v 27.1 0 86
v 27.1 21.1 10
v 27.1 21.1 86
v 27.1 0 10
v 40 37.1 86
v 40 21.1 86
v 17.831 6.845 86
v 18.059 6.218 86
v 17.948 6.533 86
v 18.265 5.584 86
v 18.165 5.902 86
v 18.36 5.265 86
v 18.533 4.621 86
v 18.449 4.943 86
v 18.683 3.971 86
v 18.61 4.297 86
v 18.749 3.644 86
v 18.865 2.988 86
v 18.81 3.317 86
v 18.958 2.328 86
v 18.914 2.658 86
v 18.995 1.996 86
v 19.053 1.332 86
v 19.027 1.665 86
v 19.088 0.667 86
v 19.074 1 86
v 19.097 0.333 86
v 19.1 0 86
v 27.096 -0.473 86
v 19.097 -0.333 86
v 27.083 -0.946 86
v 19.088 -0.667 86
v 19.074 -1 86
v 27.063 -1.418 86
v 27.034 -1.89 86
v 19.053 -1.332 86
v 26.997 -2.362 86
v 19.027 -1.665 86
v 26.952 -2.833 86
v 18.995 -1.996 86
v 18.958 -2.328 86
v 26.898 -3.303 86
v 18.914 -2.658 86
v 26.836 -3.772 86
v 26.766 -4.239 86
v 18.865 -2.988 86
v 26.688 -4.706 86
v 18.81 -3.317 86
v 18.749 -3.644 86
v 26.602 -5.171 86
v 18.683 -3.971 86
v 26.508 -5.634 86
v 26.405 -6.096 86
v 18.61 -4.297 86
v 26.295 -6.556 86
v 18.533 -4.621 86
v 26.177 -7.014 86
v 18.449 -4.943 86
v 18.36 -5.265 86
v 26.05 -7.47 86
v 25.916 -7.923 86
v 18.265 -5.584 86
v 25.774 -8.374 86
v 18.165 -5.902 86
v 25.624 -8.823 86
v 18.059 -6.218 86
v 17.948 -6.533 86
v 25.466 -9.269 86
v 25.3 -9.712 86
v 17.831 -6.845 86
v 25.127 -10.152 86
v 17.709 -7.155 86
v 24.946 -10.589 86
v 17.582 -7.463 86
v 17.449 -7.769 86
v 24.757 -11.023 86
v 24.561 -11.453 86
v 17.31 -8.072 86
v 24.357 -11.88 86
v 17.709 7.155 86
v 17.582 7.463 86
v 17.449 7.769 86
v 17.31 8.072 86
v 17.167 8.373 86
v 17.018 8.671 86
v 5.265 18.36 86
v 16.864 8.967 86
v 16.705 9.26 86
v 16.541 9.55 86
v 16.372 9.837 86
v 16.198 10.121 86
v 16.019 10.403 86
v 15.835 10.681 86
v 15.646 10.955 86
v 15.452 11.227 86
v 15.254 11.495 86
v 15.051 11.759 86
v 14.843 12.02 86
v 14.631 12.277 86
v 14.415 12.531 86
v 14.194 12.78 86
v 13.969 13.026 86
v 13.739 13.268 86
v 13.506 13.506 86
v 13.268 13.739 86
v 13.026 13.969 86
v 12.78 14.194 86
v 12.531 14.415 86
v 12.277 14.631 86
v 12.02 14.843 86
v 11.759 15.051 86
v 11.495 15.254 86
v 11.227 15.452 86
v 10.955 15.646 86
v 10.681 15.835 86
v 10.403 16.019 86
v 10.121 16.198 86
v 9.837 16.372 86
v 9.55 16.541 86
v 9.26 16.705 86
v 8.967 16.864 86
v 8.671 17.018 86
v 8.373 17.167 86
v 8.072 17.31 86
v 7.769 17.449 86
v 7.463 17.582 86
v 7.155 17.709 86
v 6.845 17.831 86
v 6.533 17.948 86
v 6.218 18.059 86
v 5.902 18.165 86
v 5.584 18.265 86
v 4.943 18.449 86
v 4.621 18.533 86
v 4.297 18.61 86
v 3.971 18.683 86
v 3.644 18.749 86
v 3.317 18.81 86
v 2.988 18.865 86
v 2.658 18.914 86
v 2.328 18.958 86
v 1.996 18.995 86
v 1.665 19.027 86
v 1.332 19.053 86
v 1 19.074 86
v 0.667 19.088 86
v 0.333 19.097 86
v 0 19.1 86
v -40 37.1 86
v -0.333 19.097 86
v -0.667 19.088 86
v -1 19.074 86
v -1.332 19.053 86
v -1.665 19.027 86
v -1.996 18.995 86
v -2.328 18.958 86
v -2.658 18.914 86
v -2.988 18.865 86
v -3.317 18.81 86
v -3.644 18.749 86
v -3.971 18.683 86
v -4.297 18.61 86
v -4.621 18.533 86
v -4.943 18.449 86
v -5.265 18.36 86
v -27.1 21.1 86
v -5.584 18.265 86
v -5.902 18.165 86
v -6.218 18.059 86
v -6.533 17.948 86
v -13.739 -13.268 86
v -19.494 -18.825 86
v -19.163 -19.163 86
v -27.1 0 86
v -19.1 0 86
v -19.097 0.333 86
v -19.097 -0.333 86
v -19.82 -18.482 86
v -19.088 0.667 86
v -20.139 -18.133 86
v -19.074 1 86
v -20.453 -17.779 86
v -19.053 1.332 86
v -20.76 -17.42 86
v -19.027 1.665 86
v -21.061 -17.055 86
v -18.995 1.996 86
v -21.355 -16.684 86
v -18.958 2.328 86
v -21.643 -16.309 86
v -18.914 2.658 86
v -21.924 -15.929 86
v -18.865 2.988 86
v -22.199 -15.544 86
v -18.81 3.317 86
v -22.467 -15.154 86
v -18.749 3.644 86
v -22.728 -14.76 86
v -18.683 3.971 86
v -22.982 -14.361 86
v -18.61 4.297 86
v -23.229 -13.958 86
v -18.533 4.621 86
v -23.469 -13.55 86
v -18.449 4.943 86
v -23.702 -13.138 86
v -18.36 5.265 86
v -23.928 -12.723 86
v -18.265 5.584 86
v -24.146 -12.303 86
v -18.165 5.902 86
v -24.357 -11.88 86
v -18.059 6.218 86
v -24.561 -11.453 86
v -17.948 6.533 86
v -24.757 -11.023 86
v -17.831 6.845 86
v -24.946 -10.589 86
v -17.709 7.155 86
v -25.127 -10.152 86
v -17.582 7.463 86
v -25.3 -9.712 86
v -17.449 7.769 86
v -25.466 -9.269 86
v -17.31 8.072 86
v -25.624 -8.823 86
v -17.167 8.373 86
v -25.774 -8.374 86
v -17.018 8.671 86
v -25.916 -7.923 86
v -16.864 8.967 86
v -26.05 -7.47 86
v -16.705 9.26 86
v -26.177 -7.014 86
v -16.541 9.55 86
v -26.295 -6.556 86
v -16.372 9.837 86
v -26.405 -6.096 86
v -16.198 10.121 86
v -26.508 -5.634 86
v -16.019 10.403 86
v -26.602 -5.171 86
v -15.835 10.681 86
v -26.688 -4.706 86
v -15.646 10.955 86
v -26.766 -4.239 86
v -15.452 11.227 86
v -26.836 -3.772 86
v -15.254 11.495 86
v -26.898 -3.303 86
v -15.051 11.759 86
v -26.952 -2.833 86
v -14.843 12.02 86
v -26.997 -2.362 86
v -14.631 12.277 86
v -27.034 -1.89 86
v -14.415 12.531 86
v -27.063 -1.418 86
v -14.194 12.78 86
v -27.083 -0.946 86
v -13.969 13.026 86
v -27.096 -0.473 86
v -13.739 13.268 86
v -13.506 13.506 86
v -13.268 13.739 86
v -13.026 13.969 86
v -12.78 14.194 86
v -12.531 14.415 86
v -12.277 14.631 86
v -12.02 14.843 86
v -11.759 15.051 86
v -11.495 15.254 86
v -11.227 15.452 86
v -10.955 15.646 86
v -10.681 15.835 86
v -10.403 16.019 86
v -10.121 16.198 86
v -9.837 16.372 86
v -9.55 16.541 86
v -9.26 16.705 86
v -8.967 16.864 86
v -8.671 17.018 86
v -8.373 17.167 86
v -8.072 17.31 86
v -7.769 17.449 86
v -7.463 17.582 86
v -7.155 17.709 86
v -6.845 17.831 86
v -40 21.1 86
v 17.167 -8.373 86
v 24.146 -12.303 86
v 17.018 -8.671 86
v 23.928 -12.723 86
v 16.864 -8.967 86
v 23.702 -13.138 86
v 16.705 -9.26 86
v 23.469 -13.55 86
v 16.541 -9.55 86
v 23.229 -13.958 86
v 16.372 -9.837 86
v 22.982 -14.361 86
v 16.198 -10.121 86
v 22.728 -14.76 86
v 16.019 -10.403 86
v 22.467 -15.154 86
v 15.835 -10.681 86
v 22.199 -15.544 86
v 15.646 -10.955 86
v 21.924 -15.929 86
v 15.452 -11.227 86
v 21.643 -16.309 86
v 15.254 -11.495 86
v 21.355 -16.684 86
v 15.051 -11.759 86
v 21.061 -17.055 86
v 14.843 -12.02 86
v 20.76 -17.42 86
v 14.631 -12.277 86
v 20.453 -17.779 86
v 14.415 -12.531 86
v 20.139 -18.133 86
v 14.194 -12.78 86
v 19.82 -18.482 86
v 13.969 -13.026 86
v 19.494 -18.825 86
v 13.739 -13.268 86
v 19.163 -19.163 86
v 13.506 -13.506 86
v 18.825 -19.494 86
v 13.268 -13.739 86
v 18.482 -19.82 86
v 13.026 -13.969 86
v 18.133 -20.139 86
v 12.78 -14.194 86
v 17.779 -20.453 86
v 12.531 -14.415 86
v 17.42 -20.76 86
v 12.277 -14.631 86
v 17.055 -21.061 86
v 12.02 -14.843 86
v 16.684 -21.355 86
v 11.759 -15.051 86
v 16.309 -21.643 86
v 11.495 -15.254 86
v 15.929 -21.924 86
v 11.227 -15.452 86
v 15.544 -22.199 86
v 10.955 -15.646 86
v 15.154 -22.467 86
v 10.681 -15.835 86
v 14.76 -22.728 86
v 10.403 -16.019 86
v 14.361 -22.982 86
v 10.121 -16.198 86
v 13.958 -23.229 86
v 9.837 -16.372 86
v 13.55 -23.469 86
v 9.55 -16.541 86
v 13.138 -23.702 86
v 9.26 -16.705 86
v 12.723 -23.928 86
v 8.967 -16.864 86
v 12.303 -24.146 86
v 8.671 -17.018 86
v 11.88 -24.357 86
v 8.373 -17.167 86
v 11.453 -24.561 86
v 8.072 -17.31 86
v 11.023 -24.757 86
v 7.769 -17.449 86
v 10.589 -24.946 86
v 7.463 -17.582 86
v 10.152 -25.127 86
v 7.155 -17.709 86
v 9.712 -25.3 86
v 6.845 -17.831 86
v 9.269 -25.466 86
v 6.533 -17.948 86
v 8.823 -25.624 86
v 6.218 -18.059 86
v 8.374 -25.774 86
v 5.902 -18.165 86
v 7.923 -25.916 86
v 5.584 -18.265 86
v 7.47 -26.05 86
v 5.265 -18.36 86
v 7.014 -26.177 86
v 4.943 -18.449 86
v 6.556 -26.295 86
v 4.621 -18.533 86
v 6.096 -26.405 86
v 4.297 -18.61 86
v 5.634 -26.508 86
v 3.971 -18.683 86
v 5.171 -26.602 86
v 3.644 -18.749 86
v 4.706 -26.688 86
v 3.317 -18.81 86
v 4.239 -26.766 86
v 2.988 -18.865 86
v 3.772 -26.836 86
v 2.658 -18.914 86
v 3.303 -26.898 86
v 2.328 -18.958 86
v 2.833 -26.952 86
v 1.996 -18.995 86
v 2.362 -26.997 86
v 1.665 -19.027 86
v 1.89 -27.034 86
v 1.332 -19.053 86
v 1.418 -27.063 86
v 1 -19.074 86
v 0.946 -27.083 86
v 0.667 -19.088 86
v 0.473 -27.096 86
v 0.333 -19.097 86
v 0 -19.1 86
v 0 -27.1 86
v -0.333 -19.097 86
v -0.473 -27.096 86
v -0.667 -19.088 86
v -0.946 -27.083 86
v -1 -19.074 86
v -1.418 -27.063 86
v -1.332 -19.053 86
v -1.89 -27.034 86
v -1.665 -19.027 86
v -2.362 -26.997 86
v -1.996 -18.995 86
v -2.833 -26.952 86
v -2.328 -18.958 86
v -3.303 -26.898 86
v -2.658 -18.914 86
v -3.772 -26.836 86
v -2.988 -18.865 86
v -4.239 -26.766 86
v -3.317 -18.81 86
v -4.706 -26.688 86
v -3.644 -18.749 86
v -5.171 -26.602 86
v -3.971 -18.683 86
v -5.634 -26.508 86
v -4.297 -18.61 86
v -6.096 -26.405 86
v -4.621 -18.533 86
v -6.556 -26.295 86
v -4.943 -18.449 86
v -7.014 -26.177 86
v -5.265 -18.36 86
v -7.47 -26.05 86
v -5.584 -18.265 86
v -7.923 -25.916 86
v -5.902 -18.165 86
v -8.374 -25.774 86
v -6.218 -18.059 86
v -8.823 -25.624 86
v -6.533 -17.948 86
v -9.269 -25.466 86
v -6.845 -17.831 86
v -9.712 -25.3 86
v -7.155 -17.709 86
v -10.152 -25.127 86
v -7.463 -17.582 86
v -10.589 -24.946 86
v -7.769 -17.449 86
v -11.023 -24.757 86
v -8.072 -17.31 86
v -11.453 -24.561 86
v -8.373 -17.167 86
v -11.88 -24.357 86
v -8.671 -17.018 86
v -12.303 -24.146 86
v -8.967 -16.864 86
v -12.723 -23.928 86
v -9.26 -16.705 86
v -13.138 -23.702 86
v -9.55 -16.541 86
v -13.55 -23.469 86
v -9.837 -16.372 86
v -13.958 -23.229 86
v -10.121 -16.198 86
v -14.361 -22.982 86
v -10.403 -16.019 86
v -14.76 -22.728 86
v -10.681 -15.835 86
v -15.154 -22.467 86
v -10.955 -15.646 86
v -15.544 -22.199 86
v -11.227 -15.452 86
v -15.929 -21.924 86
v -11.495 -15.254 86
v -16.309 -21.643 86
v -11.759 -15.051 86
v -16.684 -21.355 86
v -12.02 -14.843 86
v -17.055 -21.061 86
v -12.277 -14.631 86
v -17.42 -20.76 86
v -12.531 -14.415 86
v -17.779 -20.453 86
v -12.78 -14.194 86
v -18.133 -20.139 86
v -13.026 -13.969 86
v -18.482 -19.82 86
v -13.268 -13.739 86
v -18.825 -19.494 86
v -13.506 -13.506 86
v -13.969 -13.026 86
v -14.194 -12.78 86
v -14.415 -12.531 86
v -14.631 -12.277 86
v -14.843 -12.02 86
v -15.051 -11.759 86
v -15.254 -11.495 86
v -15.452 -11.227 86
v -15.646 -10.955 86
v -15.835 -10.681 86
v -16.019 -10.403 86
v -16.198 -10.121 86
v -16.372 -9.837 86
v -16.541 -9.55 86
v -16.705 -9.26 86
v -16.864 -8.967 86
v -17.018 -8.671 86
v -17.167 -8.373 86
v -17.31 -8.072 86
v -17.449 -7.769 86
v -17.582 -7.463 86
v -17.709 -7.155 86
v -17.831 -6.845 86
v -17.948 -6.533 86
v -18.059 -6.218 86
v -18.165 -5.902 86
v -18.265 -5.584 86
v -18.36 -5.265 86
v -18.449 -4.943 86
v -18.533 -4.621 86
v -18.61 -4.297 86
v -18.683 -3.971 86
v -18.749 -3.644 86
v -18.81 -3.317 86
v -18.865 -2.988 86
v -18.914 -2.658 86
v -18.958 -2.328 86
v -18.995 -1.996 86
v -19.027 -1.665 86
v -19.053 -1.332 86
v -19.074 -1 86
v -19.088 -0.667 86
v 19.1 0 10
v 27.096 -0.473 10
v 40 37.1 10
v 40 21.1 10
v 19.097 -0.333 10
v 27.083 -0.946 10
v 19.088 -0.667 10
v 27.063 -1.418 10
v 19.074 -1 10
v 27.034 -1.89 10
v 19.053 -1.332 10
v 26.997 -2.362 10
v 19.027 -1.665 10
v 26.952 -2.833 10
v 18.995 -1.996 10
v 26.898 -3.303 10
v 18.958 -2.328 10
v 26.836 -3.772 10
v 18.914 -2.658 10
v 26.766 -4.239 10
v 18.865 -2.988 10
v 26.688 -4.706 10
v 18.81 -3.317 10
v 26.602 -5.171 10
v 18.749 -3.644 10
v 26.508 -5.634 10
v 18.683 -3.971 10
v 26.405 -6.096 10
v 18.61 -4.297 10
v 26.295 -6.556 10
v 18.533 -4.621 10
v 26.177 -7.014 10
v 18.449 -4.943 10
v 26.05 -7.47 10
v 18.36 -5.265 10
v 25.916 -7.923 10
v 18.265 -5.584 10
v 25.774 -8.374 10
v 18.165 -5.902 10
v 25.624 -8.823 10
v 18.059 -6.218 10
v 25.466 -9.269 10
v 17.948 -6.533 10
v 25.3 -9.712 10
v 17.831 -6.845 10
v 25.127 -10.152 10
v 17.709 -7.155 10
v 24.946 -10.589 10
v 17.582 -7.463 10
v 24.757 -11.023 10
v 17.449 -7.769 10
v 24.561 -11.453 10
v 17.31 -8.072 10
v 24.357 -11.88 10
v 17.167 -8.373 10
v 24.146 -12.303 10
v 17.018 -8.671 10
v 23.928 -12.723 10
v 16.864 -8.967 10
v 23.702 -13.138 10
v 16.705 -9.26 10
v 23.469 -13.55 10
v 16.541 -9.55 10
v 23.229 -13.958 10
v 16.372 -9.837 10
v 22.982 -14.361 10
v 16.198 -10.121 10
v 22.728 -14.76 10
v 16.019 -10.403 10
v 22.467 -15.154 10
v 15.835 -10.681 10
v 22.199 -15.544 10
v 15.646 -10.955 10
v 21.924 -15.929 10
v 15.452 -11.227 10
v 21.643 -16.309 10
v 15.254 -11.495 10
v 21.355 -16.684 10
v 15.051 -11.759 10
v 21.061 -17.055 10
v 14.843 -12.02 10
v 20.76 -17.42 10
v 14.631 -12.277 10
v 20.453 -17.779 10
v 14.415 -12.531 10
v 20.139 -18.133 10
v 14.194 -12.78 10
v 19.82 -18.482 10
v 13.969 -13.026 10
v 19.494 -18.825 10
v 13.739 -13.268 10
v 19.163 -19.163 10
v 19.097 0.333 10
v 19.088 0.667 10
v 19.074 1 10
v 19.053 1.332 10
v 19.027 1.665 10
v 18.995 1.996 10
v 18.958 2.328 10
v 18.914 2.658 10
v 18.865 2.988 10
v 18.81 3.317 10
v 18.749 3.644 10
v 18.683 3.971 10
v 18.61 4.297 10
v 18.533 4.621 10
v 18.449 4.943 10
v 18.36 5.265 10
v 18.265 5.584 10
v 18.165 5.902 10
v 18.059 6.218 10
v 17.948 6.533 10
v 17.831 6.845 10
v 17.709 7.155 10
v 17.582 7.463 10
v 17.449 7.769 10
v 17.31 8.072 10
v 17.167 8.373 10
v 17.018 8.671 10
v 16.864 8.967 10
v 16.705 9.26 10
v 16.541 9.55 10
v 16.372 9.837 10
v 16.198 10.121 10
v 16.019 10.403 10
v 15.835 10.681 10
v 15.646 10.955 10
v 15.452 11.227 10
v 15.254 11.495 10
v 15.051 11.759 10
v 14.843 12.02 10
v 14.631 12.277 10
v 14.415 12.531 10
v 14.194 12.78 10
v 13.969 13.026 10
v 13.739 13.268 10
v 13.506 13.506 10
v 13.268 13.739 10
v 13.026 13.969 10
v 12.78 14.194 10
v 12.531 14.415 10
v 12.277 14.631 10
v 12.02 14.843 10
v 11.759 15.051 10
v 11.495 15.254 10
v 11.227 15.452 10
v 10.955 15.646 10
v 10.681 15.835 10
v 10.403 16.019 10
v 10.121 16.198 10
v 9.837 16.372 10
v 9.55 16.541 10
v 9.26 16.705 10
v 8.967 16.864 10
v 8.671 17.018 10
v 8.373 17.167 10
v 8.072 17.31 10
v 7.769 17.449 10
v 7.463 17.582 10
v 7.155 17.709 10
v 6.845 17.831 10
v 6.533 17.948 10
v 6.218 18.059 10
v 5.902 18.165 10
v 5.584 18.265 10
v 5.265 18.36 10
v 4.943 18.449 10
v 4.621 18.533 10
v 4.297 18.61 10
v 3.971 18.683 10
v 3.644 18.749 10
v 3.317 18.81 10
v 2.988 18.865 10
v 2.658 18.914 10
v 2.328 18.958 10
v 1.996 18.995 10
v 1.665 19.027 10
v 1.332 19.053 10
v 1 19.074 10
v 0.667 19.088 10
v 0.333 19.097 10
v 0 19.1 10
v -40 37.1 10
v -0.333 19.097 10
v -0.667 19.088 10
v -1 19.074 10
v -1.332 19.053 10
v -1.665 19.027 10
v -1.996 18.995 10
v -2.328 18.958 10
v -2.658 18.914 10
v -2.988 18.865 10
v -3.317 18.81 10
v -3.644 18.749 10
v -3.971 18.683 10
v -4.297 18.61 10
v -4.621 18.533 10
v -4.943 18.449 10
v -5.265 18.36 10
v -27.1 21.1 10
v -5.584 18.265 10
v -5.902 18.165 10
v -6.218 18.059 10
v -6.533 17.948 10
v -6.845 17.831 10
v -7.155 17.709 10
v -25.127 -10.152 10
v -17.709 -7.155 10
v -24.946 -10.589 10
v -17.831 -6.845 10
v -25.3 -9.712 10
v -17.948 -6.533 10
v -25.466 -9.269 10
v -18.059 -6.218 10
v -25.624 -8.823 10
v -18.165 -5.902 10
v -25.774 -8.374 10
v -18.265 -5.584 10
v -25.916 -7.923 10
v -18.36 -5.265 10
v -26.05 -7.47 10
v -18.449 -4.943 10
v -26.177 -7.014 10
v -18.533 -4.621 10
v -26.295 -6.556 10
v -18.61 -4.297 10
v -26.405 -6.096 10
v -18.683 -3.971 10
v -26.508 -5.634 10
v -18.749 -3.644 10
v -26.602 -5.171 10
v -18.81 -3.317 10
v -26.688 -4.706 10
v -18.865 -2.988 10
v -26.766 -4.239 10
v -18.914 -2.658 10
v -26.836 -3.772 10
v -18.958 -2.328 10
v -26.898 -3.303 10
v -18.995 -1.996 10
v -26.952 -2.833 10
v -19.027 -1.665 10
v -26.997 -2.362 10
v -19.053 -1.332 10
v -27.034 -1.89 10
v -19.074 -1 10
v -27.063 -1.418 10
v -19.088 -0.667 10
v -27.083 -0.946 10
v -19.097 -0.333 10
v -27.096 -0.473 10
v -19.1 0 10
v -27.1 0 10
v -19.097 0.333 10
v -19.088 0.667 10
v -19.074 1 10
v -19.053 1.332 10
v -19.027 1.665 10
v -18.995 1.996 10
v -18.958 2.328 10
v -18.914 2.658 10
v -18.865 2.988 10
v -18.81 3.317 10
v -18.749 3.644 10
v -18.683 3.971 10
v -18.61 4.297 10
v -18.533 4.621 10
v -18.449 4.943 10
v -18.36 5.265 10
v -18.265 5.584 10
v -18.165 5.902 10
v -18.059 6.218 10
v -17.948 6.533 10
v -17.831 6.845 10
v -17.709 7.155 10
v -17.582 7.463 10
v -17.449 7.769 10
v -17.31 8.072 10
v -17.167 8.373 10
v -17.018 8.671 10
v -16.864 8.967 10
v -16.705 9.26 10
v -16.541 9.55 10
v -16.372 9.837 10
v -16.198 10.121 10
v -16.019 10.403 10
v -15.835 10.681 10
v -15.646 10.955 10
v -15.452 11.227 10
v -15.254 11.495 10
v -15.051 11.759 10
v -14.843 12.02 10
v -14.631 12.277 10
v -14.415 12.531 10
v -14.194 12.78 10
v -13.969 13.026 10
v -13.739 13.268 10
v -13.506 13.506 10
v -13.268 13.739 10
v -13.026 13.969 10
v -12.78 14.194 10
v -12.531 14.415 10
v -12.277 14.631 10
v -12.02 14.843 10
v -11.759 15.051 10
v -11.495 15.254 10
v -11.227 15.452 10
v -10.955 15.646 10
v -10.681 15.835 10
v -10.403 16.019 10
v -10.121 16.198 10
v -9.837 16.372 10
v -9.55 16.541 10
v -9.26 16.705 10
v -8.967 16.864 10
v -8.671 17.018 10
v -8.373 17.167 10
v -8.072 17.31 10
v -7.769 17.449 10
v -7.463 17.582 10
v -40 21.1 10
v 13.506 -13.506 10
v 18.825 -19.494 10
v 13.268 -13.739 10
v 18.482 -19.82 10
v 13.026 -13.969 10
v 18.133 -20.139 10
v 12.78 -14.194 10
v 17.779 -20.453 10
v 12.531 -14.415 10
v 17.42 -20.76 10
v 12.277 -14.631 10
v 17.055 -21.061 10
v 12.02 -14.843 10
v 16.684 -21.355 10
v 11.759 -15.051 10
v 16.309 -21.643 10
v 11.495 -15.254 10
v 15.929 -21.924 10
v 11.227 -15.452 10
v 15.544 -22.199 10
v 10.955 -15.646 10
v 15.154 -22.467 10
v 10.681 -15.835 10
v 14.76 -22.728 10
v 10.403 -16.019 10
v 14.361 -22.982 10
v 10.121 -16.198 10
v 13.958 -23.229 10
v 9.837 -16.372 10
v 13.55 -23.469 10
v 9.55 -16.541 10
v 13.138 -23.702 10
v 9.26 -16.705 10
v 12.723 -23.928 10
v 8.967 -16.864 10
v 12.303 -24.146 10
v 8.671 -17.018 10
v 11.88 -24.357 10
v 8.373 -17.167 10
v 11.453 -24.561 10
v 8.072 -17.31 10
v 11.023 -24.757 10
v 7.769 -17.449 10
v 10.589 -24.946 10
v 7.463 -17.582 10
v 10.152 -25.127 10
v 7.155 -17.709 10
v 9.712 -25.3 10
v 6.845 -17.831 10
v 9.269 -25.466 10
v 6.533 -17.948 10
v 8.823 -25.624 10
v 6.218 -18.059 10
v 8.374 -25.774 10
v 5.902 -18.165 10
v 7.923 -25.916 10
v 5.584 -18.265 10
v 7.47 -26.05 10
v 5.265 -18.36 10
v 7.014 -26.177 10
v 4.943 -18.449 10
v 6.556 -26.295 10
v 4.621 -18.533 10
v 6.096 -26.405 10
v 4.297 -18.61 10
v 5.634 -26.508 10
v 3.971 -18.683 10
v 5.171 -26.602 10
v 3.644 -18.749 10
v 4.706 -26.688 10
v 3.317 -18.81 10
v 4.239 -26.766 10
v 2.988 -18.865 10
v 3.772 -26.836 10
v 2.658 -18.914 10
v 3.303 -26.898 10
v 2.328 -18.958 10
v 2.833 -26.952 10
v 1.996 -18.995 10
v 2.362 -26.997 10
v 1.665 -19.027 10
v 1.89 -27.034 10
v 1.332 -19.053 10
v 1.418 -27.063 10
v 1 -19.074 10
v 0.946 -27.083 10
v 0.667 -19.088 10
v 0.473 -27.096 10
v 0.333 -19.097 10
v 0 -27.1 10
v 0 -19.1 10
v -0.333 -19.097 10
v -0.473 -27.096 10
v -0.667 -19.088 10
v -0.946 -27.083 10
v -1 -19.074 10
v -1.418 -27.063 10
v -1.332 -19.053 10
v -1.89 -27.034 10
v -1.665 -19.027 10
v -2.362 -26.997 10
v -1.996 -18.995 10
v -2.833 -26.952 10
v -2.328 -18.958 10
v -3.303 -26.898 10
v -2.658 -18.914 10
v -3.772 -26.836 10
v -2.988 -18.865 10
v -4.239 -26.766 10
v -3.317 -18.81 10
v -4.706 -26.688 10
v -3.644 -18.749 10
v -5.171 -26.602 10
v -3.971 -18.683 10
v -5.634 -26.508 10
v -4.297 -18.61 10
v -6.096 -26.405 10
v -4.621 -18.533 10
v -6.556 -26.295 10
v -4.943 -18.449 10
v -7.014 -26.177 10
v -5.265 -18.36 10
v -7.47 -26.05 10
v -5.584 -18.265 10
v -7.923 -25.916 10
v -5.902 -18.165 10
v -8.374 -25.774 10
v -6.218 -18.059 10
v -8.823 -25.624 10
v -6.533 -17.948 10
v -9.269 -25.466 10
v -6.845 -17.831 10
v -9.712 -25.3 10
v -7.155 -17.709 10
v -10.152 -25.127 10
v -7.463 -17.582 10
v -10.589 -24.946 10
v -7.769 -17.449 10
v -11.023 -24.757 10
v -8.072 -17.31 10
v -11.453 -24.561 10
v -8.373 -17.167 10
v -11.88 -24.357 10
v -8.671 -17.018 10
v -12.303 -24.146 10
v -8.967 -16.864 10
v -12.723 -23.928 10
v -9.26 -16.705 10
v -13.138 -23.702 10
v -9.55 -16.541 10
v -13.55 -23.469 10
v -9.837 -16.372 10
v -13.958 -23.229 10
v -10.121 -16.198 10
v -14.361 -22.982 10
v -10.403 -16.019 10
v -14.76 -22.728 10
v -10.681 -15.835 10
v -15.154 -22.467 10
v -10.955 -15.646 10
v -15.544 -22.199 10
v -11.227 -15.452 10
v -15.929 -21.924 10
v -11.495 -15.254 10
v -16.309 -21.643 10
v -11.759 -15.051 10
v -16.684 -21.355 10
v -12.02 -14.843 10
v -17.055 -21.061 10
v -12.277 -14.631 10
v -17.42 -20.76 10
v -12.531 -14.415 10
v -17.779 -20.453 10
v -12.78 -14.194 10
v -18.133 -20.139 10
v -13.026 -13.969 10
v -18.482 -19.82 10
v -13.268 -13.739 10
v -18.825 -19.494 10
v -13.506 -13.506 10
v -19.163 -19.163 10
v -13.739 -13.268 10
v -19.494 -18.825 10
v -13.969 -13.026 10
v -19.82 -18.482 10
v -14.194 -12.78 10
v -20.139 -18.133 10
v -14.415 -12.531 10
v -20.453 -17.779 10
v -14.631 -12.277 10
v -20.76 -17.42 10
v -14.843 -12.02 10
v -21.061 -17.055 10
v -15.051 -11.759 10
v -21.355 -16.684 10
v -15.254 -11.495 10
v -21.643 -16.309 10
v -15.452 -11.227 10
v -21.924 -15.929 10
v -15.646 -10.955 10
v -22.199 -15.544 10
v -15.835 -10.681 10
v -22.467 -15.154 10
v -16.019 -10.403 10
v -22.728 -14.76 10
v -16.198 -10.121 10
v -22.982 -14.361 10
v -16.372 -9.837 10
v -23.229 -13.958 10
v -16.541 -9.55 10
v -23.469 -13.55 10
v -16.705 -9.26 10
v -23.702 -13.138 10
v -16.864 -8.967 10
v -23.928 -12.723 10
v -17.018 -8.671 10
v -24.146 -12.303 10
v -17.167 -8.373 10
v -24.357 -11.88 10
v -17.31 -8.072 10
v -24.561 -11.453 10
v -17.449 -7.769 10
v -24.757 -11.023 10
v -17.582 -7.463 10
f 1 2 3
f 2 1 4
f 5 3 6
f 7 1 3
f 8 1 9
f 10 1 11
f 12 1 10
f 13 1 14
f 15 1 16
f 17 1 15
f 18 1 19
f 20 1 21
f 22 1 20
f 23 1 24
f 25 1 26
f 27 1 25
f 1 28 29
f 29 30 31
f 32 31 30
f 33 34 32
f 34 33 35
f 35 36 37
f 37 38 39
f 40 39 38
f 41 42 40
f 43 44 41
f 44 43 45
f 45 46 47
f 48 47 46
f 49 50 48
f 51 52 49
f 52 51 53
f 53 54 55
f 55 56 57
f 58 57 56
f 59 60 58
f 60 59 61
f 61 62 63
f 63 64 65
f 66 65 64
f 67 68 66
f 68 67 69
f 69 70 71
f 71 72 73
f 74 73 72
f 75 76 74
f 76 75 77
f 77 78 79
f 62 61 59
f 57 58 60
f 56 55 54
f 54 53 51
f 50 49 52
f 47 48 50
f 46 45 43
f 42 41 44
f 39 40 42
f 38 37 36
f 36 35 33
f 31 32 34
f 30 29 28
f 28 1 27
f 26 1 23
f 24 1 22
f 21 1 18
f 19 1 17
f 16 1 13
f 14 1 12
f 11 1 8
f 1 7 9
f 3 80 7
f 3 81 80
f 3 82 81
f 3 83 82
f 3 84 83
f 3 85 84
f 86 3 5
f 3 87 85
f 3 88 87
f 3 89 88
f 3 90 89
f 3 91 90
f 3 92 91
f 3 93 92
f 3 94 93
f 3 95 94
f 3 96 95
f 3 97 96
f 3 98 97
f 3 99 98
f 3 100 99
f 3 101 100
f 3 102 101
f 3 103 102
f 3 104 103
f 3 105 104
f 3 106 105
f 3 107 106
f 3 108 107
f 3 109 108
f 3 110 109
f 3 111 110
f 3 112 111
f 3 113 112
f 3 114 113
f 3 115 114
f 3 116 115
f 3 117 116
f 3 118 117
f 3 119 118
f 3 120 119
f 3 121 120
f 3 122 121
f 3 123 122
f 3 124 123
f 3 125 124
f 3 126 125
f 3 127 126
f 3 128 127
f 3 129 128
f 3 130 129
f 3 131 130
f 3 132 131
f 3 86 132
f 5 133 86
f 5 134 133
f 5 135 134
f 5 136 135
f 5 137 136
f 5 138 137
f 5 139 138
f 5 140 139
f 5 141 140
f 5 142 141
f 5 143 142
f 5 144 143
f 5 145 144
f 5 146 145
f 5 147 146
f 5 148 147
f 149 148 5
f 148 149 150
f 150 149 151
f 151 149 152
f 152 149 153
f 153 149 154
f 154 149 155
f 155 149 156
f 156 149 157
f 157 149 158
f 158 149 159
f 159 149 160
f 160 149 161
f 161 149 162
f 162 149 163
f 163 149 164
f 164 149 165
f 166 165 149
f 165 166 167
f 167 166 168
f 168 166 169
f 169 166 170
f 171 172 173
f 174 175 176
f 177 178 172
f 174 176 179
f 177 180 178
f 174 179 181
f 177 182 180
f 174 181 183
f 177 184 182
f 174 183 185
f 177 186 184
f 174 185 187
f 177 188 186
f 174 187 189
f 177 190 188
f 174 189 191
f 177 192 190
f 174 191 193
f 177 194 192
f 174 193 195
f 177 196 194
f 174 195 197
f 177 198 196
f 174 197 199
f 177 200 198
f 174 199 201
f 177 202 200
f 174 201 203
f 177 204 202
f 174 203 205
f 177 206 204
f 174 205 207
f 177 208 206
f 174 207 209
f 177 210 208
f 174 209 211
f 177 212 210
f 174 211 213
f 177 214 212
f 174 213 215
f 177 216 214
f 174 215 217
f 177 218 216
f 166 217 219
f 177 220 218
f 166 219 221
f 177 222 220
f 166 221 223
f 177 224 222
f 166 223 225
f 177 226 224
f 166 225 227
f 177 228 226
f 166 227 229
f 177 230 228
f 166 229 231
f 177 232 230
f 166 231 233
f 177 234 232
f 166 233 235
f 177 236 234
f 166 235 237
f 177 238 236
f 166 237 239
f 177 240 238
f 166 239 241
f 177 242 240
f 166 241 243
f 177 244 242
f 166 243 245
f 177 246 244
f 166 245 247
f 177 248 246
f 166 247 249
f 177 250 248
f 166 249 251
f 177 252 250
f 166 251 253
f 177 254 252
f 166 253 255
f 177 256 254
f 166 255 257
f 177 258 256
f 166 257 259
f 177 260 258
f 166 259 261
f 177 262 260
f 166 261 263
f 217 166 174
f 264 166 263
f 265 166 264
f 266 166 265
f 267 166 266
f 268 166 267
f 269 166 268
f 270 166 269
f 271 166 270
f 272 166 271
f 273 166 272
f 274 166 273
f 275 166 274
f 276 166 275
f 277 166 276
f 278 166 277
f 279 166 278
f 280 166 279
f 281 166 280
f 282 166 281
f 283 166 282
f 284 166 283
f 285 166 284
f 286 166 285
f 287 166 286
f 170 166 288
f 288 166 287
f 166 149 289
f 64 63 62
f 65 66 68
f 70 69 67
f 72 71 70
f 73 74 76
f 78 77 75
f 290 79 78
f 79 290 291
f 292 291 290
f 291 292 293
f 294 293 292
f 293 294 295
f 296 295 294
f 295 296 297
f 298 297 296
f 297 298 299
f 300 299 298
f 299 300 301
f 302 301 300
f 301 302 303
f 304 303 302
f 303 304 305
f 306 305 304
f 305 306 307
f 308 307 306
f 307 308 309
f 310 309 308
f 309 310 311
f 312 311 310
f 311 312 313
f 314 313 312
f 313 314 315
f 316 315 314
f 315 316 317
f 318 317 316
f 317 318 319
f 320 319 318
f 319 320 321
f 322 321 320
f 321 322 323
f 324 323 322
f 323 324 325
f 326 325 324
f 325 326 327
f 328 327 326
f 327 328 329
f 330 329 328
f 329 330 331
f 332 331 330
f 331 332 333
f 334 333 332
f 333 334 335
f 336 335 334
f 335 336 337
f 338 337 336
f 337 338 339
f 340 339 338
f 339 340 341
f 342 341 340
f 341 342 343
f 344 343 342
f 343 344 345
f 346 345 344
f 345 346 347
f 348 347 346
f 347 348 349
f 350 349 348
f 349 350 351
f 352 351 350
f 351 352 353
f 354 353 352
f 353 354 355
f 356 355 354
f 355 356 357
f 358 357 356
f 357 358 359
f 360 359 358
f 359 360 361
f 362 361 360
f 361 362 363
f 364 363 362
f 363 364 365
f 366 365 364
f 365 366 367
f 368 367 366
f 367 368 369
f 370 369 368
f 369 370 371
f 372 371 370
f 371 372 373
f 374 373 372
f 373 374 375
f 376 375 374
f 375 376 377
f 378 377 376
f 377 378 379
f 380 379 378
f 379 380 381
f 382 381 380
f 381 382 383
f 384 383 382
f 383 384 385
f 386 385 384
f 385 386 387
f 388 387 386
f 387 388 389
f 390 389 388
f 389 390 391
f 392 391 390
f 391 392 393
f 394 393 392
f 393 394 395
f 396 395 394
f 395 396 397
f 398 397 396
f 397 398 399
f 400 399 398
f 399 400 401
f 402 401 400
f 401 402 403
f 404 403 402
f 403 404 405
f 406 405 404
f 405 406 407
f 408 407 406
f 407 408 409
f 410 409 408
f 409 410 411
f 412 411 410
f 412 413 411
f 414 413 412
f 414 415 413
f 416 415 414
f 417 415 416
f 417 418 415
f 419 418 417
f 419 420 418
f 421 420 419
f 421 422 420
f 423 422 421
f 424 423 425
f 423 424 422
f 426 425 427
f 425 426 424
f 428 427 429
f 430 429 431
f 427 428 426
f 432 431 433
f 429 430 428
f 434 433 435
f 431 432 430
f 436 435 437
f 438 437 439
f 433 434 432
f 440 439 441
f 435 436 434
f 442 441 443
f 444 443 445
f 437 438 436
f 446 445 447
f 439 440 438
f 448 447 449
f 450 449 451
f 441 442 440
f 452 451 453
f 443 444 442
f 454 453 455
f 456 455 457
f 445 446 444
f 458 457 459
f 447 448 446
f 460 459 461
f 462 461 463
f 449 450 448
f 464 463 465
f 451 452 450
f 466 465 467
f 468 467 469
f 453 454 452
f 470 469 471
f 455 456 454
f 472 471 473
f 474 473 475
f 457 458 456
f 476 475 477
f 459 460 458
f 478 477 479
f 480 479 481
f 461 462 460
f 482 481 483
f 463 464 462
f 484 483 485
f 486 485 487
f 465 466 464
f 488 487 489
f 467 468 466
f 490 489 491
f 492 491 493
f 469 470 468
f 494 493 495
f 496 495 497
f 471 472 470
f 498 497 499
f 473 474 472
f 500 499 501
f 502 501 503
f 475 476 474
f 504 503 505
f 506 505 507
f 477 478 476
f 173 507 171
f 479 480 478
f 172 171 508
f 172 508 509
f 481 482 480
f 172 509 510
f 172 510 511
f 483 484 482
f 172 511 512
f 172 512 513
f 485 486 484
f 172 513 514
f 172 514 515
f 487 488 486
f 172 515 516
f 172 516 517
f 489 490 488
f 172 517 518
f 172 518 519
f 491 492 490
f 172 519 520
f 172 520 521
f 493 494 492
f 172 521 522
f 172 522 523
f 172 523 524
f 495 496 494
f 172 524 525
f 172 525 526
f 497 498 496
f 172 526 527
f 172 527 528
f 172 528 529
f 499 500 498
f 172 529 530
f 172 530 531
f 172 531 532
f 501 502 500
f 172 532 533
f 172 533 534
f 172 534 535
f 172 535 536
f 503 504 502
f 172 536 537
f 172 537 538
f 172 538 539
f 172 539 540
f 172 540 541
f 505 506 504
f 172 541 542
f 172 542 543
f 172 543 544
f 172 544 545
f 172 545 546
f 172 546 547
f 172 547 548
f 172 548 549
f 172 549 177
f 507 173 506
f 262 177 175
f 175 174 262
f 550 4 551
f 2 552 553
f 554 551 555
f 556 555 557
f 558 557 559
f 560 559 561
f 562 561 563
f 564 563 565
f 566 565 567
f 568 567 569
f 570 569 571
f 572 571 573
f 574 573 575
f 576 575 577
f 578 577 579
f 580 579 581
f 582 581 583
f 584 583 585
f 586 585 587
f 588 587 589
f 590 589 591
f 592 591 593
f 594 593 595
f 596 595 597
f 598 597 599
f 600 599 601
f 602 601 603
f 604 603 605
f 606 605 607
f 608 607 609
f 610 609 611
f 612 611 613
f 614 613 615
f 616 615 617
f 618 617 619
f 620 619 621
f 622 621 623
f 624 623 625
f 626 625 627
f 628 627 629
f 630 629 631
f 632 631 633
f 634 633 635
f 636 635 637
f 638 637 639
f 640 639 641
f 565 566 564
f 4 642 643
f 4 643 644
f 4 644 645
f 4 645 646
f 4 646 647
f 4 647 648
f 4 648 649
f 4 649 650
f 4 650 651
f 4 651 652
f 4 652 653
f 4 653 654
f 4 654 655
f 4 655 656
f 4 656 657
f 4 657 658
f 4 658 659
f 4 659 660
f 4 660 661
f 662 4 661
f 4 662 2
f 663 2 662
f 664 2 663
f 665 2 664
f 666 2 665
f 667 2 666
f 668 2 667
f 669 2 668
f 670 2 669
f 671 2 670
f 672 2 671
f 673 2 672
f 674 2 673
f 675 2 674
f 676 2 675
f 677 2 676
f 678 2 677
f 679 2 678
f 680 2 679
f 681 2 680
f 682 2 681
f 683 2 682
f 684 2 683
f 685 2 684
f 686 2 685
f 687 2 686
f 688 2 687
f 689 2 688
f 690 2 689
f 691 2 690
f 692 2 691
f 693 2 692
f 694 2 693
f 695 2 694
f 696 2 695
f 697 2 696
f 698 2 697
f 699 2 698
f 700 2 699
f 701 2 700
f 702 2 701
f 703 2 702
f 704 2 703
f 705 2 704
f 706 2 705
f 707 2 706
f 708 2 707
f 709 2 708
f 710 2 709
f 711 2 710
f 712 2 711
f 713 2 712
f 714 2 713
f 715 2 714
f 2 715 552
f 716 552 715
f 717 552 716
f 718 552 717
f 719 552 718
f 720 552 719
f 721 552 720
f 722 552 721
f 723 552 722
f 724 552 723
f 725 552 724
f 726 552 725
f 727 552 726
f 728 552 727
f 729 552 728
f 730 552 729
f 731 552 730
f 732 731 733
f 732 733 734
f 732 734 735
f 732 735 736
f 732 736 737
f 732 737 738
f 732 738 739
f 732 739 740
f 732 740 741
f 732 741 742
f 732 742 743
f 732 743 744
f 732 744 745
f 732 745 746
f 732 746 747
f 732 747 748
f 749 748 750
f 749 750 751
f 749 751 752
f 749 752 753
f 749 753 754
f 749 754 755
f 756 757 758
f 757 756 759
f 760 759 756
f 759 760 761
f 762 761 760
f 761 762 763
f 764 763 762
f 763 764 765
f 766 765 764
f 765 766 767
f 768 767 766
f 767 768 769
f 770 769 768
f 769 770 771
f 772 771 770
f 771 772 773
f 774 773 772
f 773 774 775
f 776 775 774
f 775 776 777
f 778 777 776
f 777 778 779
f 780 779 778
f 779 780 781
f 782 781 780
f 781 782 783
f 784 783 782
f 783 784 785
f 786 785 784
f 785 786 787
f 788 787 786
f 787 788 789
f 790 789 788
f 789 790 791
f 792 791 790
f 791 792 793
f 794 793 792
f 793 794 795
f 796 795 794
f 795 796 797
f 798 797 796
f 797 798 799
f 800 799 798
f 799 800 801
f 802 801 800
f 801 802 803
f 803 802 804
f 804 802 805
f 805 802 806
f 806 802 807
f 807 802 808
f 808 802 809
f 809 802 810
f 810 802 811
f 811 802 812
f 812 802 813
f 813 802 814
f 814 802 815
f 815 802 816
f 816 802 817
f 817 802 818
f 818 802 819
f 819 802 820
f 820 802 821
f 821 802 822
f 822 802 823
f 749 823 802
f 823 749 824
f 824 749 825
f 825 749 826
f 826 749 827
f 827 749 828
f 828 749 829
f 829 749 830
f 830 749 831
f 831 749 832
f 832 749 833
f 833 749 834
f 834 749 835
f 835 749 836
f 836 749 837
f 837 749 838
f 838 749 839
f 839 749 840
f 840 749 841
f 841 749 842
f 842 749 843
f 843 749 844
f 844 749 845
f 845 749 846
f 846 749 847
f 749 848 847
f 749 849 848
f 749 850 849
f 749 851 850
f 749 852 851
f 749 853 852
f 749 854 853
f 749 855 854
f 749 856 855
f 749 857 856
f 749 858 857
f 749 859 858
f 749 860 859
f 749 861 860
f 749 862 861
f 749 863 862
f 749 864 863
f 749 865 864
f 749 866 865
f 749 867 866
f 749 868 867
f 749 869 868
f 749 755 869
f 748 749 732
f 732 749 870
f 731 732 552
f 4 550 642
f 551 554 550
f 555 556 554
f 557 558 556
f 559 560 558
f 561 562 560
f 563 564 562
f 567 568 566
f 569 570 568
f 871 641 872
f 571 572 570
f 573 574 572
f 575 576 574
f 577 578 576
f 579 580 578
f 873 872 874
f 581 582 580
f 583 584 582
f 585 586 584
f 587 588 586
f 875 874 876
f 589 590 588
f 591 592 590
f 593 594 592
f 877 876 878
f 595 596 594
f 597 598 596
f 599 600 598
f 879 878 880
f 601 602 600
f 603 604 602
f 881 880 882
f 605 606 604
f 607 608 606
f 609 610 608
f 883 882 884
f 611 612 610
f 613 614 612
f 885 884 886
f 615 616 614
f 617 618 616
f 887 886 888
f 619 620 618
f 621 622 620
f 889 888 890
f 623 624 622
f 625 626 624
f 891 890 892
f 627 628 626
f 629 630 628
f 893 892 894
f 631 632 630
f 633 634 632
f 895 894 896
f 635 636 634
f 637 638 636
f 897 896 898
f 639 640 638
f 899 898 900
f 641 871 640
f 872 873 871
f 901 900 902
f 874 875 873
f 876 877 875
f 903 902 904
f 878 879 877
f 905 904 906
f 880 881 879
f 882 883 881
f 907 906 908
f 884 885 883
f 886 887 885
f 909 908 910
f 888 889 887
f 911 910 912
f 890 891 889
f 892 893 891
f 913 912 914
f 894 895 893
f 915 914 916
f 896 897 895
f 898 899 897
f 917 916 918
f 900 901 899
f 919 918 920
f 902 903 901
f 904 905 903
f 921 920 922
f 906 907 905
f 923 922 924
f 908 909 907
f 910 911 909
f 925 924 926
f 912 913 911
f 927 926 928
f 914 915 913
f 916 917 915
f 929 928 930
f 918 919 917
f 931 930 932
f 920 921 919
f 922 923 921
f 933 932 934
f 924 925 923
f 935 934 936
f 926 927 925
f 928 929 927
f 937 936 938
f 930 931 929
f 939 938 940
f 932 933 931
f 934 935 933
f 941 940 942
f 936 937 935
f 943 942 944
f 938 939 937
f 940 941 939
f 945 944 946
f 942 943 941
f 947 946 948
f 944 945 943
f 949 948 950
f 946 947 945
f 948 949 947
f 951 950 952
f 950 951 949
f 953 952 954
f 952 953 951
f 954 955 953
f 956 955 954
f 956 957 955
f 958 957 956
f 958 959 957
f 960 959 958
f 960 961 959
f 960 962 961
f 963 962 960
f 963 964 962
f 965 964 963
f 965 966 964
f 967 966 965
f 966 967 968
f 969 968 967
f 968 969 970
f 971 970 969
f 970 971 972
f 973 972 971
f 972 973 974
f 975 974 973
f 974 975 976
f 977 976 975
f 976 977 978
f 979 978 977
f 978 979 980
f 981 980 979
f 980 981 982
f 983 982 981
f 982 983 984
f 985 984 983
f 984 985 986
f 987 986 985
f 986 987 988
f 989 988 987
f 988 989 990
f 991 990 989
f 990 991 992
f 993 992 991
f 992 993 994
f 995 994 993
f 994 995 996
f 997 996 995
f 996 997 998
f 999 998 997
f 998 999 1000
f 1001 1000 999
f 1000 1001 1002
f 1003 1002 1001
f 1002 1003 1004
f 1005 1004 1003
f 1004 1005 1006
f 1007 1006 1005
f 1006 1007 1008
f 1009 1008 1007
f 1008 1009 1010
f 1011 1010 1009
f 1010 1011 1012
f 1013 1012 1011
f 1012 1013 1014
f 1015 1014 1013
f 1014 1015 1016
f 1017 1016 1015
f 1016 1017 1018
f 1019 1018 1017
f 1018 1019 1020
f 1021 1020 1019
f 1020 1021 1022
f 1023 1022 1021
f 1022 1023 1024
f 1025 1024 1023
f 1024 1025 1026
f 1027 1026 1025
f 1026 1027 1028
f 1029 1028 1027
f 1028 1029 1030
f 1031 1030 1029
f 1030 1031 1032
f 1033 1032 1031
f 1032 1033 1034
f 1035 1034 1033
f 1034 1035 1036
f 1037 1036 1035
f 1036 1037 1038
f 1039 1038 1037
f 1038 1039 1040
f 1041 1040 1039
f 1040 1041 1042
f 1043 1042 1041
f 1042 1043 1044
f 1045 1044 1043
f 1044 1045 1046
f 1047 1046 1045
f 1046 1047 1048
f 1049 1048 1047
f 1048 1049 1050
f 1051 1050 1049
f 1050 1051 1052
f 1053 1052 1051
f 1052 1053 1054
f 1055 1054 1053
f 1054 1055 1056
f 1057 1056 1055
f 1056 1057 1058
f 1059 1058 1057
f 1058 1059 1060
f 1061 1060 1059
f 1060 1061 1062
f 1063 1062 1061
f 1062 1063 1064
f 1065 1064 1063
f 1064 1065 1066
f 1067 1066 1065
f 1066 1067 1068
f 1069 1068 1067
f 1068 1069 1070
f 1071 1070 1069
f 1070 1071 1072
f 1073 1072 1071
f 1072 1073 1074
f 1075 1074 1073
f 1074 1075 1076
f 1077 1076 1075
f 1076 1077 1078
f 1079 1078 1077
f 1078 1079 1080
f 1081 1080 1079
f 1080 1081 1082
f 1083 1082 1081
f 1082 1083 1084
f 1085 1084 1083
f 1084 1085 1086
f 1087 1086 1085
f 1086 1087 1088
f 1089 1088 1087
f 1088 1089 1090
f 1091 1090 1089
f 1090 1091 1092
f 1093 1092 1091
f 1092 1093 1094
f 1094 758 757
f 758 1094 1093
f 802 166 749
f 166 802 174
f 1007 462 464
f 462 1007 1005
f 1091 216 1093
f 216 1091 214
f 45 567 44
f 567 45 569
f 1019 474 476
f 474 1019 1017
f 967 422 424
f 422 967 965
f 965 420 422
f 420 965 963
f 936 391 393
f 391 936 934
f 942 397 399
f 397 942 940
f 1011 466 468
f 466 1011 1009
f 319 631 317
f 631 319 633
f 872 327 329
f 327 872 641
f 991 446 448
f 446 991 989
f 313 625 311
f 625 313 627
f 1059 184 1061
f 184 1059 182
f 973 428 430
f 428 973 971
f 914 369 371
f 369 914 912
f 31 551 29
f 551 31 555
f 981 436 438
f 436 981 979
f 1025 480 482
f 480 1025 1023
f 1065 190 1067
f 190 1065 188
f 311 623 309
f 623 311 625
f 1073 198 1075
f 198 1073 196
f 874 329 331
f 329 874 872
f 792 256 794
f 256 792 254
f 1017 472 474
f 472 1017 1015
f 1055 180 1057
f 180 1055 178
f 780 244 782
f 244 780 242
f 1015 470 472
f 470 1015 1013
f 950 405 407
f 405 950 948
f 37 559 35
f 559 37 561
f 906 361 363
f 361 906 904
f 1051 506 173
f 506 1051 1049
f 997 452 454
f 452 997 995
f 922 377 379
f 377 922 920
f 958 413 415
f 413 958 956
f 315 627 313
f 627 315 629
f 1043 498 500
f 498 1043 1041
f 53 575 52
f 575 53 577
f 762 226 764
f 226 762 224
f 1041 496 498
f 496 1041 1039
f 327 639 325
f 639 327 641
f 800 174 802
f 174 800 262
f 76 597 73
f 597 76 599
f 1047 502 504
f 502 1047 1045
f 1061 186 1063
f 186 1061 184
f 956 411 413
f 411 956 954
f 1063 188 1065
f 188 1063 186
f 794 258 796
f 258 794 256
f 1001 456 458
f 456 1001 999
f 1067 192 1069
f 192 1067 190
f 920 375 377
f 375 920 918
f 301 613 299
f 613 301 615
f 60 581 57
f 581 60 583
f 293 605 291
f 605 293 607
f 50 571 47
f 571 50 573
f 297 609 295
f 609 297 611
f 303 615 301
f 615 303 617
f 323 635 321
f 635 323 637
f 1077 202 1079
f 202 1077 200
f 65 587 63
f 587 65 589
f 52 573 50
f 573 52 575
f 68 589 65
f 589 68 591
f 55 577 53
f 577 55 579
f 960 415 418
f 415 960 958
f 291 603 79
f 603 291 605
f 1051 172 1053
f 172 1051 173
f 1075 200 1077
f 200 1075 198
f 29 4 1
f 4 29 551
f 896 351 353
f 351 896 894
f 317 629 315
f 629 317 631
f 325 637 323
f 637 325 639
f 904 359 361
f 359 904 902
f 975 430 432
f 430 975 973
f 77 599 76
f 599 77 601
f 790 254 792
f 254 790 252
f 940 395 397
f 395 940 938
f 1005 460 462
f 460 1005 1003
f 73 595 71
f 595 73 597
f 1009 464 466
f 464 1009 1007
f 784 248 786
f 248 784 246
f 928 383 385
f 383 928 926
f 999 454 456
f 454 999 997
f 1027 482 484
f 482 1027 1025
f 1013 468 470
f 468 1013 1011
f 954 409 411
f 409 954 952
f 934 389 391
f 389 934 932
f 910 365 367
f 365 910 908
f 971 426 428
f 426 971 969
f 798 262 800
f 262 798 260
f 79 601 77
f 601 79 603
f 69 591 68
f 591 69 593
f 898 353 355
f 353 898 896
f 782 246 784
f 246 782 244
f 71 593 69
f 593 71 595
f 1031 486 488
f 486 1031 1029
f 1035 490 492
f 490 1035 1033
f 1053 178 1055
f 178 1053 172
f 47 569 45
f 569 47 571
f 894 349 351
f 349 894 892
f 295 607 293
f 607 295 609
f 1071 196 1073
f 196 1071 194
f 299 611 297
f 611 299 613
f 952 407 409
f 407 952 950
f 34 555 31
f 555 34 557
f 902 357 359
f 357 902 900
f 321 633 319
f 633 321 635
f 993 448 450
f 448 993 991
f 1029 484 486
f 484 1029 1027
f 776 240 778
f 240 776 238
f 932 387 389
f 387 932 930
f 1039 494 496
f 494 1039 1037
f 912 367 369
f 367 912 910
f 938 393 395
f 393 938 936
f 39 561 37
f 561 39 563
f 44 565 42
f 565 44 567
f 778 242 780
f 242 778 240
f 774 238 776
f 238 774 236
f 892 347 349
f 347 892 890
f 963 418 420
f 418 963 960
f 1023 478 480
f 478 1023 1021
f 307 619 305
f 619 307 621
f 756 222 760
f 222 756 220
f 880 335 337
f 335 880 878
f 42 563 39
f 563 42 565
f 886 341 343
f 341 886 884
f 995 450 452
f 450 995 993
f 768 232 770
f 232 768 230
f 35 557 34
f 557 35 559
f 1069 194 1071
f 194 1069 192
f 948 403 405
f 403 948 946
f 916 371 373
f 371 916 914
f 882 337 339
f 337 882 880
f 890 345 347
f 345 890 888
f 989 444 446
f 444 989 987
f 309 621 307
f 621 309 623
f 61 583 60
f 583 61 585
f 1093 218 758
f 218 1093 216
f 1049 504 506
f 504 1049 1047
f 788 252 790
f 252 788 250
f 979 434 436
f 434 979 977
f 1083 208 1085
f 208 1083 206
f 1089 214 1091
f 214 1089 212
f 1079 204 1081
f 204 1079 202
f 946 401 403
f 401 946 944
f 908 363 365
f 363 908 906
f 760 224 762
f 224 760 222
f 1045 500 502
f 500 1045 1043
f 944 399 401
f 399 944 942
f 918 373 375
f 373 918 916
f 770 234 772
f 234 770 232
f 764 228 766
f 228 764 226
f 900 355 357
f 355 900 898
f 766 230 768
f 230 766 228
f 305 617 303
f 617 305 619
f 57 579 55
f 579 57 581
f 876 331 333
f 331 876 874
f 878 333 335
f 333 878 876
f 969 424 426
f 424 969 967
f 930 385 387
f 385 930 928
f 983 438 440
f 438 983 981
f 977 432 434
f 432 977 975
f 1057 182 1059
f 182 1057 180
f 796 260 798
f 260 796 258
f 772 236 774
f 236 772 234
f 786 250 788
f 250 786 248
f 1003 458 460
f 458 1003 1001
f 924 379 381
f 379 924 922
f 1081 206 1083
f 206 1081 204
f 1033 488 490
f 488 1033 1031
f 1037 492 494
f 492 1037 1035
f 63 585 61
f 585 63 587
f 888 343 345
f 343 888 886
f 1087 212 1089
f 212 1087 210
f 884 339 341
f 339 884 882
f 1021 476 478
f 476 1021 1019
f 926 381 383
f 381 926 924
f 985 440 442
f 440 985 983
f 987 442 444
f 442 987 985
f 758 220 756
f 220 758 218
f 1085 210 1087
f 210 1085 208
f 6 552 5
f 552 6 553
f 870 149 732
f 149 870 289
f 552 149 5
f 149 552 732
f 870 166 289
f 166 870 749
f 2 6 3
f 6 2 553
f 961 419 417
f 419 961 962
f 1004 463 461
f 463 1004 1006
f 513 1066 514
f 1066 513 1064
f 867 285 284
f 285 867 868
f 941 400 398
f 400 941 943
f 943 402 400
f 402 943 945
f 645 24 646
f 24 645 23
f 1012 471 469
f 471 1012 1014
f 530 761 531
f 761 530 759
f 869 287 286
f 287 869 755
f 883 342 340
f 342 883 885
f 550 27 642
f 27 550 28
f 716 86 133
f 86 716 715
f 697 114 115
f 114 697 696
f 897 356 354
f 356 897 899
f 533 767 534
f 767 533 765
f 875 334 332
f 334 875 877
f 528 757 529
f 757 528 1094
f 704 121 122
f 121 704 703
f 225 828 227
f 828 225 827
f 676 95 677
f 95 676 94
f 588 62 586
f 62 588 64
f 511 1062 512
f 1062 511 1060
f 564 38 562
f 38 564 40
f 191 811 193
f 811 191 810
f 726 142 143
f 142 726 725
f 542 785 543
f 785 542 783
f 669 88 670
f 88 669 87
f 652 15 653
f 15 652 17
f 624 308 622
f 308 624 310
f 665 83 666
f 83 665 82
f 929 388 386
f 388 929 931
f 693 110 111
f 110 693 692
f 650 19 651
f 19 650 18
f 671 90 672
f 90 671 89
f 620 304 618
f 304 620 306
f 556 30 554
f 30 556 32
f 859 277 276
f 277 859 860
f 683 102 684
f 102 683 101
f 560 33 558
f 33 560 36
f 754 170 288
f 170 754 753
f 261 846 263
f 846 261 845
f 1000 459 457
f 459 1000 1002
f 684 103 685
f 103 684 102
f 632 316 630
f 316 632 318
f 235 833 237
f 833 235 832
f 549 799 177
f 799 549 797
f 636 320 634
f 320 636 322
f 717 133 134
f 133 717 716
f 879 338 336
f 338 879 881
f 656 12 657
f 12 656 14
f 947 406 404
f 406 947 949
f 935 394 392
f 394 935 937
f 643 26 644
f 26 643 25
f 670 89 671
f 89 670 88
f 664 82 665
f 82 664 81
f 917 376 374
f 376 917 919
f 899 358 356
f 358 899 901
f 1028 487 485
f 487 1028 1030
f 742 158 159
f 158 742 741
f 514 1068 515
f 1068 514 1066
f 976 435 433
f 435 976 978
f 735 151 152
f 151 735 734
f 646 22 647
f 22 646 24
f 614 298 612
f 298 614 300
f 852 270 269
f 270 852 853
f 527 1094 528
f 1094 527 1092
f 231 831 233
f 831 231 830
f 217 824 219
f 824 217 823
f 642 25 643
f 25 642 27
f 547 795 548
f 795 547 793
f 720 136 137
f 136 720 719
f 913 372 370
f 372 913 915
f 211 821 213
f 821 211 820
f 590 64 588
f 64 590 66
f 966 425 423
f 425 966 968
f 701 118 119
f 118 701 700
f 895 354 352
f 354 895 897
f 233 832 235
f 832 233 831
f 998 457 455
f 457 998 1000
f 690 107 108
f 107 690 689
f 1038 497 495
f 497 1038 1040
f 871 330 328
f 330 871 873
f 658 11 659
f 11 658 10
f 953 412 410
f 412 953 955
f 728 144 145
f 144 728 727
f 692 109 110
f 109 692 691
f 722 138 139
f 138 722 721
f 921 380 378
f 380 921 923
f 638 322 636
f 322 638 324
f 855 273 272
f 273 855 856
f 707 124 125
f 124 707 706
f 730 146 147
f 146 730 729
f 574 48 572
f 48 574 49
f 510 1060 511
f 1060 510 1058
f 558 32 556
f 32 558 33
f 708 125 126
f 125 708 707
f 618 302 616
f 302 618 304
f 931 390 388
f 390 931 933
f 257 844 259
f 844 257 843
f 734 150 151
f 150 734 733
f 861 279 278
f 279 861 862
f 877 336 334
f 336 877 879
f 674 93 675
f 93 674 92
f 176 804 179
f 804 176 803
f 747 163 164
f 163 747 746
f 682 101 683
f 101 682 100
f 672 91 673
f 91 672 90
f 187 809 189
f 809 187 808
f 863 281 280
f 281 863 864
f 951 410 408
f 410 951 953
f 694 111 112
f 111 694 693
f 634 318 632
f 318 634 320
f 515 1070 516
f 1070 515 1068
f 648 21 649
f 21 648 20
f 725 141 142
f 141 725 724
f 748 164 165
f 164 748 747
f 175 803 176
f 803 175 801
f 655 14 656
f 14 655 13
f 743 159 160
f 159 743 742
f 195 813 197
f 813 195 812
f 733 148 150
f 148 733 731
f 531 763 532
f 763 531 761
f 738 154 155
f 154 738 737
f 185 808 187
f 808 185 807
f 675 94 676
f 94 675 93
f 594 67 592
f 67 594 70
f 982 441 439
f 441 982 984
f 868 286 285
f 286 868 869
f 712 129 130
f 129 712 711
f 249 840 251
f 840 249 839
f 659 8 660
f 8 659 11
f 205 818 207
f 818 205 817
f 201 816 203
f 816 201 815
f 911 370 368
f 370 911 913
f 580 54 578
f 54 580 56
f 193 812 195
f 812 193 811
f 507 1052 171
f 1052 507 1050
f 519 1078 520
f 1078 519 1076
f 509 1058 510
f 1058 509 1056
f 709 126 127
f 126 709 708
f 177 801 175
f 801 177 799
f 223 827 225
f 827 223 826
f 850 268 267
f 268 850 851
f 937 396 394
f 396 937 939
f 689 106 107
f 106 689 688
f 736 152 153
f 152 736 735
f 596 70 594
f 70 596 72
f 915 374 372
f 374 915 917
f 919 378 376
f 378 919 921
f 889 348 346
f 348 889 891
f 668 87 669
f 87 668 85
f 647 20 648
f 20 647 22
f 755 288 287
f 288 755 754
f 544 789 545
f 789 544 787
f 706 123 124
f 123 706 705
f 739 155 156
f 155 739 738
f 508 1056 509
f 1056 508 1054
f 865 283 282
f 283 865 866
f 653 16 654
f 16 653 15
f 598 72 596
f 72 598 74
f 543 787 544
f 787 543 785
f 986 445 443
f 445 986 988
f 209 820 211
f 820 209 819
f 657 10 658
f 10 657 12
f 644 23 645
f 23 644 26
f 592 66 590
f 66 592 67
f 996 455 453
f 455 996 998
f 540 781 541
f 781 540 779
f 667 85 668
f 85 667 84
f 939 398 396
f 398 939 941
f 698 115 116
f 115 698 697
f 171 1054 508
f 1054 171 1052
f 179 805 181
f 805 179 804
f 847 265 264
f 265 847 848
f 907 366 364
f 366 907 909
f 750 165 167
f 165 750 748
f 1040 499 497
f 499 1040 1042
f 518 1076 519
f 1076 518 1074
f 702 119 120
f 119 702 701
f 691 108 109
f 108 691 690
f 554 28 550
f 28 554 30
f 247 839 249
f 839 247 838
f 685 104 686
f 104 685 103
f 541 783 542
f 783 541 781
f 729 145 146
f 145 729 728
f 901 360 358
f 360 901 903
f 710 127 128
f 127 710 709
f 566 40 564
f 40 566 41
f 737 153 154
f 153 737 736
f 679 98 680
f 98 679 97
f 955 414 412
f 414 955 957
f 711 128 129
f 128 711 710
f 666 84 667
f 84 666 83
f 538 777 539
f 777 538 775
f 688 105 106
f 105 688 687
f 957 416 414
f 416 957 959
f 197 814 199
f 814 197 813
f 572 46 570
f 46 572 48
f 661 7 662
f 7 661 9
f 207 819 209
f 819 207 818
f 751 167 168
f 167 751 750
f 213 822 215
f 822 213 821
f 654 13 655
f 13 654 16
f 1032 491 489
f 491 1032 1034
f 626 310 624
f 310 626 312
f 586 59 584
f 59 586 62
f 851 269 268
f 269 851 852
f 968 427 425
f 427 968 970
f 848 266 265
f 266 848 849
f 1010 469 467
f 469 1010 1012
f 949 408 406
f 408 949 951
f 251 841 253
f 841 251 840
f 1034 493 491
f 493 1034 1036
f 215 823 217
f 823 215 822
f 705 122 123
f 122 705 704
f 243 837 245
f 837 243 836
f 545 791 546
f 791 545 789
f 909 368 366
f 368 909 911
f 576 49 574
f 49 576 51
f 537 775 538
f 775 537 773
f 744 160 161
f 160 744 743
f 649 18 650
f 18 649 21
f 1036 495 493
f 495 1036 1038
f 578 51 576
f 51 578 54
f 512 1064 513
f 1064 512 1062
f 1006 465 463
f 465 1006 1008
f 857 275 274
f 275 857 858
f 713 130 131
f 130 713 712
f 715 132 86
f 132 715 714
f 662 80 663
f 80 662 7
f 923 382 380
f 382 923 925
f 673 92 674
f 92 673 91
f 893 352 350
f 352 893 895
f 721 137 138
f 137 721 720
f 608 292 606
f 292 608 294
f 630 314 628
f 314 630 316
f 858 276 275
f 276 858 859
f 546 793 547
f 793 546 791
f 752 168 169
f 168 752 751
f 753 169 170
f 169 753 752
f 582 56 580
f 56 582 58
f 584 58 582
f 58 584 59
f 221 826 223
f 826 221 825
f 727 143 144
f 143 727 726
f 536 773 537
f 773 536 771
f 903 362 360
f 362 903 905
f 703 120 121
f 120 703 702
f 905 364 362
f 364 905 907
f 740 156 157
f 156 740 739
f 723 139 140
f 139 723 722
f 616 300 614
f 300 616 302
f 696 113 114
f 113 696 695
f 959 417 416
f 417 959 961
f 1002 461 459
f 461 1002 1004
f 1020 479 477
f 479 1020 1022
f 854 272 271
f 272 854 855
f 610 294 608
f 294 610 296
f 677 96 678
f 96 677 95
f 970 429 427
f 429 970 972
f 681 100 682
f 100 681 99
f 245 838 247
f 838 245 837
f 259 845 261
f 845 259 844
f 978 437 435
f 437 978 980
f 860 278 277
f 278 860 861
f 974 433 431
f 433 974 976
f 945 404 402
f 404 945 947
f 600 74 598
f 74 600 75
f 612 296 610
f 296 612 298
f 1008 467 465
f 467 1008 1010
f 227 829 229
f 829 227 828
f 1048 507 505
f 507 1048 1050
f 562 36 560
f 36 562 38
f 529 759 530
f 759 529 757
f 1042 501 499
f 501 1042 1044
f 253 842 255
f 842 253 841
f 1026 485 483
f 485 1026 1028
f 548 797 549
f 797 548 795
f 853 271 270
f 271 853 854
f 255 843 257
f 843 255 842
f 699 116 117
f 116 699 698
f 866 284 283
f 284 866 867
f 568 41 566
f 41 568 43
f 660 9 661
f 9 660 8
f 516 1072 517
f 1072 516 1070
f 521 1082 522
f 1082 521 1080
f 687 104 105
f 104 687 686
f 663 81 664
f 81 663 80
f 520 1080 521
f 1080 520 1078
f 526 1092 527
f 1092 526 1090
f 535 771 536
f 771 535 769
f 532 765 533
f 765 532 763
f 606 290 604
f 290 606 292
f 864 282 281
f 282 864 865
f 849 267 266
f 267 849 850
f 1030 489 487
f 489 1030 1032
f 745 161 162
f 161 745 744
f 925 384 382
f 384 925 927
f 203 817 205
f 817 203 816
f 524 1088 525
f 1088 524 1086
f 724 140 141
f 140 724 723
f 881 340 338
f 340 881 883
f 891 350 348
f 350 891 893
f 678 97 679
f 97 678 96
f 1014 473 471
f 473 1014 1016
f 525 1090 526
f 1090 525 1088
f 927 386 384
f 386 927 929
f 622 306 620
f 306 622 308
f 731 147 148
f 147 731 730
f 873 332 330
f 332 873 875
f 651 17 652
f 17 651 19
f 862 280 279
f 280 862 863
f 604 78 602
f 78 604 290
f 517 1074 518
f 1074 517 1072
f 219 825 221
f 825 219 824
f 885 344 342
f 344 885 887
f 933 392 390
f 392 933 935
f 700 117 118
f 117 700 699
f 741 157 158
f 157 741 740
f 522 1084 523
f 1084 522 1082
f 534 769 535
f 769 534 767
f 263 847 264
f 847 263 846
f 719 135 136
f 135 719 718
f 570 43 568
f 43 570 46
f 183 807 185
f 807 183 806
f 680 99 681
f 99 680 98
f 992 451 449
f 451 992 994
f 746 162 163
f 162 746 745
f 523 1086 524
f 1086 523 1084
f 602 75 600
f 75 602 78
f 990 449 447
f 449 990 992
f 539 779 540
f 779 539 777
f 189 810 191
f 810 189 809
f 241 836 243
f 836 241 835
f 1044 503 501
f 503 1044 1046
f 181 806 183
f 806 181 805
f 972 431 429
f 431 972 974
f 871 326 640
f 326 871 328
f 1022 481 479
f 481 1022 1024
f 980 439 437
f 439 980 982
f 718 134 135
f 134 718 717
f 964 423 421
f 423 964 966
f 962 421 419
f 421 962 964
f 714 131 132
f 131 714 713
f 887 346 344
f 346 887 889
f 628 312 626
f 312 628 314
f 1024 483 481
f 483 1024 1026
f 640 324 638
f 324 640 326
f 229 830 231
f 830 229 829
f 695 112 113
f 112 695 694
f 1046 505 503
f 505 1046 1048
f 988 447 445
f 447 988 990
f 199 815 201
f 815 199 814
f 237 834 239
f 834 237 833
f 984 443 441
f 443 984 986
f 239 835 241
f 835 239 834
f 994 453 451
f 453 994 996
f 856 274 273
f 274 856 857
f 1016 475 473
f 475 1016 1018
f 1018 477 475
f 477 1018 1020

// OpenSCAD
$fn=360;
d = 38.2;
D = 44;

h = 76;
H = 10;
module bottom_bracket(){
  cylinder(d2=D, d1=D-2, h=H);
  translate([0, 0, H])cylinder(d=d, h=h);
  translate([0, 0, h + H])cylinder(d1=D, d2=D-2, h=H);
  translate([0, 0, H + h + H])import("../stl/bb_washer.stl");
}
module mount(){
  thickness = 8;
  difference(){
    union(){
      translate([0, d/4 + thickness/2, h/2])cube([d + 2 * thickness, d/2 + thickness, h], center=true);
      cylinder(d=d + 2 * thickness, h=h);
      translate([0, d/2+10, h/2])cube([80, 2 * thickness, h], center=true);
    }
    union(){
      translate([0, 0, -1])cylinder(d=d, h=h+2);
    }
  }
}
translate([0, 0, H])
mount();
